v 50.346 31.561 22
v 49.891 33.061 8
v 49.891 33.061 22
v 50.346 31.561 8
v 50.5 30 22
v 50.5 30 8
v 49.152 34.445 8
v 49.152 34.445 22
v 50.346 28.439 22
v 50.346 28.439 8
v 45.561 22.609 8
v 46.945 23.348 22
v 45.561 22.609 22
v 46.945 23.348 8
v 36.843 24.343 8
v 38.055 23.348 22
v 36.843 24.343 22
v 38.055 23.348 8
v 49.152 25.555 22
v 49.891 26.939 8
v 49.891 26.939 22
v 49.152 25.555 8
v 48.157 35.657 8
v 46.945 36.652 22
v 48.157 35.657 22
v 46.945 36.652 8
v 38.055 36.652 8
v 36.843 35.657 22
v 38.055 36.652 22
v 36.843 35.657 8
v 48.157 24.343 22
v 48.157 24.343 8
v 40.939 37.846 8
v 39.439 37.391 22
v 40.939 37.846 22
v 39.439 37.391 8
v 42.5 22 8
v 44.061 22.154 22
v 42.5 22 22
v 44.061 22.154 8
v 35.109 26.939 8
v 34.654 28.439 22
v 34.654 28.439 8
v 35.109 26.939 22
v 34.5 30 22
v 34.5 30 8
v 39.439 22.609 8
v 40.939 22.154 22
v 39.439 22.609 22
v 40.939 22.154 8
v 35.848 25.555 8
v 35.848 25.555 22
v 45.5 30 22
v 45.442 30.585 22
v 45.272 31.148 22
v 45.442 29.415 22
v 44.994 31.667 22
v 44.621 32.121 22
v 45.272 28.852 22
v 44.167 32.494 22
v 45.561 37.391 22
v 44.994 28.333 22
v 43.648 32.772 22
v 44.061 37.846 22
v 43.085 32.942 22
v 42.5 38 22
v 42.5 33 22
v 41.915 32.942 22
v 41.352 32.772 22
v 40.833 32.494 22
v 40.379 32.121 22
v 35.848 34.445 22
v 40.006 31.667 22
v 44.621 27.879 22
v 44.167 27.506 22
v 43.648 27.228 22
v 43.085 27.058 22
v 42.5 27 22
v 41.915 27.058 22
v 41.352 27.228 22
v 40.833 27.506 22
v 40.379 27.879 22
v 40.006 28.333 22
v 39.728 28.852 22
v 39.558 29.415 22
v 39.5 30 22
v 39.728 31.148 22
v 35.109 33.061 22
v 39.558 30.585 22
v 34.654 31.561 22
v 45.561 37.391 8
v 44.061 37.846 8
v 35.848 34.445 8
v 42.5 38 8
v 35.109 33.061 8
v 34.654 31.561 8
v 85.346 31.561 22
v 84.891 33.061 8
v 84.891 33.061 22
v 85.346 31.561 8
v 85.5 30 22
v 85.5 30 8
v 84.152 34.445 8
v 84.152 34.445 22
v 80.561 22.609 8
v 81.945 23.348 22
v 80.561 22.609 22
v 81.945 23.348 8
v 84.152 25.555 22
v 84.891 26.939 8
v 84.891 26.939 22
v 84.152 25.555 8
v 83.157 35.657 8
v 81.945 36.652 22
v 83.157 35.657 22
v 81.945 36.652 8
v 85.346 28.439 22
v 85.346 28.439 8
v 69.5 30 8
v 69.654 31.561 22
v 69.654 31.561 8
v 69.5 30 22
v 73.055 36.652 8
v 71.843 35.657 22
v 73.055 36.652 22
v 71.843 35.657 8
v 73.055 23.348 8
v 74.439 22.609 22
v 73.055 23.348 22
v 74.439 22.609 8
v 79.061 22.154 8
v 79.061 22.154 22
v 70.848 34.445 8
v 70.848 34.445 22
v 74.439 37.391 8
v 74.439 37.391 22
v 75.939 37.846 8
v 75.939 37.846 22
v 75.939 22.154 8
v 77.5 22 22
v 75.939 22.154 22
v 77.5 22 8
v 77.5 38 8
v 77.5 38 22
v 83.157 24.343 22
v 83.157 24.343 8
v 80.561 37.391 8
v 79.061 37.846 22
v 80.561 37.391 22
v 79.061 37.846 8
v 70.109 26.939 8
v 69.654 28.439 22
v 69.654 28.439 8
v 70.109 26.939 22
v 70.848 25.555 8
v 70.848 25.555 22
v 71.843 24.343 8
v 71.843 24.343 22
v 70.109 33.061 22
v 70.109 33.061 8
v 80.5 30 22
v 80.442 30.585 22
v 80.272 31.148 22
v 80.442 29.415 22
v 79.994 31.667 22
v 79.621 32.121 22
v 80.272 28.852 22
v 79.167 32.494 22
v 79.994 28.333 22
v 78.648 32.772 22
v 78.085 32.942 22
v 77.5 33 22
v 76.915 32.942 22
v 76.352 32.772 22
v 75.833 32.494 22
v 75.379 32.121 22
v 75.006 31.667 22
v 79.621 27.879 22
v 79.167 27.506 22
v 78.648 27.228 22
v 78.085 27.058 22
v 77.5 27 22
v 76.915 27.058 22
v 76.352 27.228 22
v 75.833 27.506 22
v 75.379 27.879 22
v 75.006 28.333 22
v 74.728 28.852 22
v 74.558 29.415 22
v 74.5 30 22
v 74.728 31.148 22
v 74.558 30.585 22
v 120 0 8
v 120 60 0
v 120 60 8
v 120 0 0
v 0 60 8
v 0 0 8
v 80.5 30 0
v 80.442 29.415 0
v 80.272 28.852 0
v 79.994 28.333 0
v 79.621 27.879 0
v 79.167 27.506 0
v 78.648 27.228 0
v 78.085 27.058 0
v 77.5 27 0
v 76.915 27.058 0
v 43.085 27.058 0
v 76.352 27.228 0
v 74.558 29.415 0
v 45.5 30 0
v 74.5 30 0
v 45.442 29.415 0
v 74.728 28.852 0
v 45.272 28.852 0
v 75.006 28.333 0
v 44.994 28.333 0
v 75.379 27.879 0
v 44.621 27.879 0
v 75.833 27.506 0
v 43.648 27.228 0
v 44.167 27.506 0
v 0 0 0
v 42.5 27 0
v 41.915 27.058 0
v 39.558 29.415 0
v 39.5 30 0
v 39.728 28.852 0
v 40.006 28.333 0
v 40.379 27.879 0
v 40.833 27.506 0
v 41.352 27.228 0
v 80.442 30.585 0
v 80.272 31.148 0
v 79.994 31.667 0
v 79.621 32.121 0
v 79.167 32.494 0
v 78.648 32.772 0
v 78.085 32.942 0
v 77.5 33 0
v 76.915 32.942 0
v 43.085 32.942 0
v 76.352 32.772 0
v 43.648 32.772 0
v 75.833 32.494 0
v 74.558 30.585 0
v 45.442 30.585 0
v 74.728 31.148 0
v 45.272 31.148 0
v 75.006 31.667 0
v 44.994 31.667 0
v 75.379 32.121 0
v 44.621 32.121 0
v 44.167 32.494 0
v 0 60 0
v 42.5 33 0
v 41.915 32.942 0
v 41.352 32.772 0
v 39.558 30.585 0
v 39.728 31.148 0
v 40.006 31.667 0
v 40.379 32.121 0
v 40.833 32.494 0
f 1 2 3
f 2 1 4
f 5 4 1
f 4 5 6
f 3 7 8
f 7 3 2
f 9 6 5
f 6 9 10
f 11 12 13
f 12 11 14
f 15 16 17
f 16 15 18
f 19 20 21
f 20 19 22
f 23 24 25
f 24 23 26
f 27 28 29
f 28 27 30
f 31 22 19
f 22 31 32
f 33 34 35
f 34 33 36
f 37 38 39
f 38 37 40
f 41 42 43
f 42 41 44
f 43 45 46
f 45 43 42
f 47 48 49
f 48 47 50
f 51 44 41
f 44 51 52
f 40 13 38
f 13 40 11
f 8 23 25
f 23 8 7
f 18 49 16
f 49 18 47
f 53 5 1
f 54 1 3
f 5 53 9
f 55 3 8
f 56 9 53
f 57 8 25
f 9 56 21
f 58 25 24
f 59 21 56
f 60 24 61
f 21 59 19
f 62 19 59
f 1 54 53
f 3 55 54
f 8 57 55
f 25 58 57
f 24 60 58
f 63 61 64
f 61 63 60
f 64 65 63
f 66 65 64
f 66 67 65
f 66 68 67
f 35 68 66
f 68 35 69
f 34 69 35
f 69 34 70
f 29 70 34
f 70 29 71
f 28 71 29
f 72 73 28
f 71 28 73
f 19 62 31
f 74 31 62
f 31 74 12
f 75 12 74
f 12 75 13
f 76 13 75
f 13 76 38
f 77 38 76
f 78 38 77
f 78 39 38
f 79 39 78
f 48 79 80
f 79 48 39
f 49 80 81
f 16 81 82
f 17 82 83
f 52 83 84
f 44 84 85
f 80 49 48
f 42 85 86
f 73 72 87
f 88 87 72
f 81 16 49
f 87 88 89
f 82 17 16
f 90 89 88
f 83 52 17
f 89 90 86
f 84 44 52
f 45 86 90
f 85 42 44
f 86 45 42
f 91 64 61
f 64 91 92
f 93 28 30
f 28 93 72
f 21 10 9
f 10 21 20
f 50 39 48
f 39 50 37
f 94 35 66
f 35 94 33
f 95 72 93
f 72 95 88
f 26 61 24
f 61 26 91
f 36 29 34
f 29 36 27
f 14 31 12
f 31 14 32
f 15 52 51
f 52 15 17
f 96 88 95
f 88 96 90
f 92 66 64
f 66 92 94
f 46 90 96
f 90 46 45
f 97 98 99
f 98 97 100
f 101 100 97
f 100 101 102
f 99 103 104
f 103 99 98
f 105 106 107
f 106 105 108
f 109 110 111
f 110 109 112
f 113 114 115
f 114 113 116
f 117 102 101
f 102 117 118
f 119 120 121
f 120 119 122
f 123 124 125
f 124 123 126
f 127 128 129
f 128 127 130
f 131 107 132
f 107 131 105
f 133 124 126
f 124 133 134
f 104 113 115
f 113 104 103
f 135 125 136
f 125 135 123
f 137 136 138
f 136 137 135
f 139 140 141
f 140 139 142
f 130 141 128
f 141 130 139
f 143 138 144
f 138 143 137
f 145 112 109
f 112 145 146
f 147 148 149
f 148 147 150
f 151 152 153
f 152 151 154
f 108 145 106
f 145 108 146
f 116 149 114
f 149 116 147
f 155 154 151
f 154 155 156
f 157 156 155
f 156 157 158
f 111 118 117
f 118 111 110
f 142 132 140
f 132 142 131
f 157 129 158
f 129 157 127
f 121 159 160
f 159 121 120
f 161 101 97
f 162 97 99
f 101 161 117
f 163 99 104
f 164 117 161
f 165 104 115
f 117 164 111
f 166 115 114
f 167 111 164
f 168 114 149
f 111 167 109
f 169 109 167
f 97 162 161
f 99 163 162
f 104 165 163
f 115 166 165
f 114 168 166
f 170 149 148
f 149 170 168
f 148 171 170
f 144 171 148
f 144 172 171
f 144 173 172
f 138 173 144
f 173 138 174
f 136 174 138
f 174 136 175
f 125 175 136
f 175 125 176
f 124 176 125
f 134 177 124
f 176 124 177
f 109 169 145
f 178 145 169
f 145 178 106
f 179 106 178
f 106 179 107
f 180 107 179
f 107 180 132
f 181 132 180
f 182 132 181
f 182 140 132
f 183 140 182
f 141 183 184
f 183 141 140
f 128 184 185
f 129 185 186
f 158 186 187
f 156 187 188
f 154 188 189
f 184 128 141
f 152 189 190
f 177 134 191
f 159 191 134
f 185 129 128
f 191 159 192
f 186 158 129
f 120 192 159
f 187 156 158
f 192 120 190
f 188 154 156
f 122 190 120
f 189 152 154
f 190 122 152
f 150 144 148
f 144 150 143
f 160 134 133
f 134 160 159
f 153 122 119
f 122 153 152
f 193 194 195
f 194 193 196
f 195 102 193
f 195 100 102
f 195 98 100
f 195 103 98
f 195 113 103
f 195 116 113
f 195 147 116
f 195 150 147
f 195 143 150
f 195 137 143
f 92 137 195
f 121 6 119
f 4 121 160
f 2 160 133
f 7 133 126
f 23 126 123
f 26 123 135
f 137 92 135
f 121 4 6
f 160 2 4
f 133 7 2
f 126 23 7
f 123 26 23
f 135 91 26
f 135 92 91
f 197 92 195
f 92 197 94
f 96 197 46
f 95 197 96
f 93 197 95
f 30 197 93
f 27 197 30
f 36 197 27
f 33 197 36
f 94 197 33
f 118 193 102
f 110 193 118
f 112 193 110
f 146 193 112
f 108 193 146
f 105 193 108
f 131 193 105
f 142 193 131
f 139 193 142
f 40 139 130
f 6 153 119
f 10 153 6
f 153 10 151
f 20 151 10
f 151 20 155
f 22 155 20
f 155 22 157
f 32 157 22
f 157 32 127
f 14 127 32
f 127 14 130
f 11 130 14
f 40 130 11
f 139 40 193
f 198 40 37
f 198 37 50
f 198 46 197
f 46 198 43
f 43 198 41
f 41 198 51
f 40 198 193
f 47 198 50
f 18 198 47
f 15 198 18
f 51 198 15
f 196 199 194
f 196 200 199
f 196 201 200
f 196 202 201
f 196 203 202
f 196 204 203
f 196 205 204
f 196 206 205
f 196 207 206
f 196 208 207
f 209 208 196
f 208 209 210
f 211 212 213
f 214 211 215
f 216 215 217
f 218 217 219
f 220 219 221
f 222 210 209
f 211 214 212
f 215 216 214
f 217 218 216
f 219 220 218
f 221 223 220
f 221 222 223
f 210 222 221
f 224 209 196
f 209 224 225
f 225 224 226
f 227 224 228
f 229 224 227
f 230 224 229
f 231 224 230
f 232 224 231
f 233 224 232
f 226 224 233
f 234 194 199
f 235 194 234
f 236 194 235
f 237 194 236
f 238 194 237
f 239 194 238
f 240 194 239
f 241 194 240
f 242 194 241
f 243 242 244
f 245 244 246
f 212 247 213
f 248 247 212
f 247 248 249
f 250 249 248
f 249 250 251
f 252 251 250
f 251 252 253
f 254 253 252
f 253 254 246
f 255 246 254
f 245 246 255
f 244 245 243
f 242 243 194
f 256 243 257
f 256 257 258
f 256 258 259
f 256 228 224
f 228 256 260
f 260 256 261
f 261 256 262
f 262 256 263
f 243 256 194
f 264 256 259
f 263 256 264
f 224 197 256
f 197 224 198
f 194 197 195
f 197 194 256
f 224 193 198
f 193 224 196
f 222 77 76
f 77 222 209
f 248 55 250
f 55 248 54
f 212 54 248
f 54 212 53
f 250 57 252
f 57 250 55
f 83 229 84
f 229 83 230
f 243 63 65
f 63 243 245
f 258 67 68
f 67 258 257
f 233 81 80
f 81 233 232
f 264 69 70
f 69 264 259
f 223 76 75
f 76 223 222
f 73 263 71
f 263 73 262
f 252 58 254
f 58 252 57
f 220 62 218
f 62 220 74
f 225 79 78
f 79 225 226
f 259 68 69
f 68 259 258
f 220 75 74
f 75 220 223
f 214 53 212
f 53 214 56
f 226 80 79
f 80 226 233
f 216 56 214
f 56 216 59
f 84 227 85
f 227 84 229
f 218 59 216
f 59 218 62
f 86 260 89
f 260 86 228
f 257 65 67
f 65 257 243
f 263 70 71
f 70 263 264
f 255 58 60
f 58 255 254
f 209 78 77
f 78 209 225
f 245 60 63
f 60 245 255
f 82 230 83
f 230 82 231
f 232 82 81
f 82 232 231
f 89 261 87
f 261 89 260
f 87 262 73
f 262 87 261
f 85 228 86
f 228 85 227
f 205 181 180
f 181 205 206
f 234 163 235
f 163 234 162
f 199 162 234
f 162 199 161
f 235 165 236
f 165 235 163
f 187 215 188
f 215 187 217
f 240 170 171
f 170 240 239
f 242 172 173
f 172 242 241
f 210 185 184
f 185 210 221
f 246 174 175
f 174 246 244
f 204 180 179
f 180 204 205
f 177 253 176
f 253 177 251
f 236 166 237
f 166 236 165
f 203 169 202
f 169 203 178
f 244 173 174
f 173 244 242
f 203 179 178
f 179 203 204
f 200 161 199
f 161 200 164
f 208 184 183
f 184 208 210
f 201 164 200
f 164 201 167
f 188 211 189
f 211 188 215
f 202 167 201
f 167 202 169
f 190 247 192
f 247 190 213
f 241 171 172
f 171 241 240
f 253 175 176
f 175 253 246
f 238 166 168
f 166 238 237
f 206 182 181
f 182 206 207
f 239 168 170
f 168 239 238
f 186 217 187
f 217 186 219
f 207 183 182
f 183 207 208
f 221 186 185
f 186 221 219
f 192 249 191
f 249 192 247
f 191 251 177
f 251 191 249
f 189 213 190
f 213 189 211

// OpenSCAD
$fn = 32;

// ----------------------------------------------------------------------
// Drill jig: two_boss jig
// ----------------------------------------------------------------------

// --- parameters (mm) ---
plate_l = 120;            // plate length, X
plate_w = 60;             // plate width, Y
plate_t = 8;              // plate thickness
boss_d = 16;              // guide boss diameter
boss_h = 15;              // boss height above the plate
guide_d = 6;              // guide hole diameter
boss_pitch = 35;          // boss pitch

n_boss = 2;  // guide bosses
boss_x0 = (plate_l - (n_boss - 1) * boss_pitch) / 2;  // first boss X
boss_top = plate_t - 1 + boss_h;  // boss crown height
total_h = boss_top;  // overall height

difference() {
  union() {
  cube([plate_l, plate_w, plate_t]);
  for (i = [0 : n_boss - 1])
    translate([boss_x0 + i * boss_pitch, plate_w / 2, plate_t - 1])
      cylinder(h = boss_h, d = boss_d);
  }
  for (i = [0 : n_boss - 1])
    translate([boss_x0 + i * boss_pitch, plate_w / 2, -1])
      cylinder(h = plate_t + boss_h, d = guide_d);
}
